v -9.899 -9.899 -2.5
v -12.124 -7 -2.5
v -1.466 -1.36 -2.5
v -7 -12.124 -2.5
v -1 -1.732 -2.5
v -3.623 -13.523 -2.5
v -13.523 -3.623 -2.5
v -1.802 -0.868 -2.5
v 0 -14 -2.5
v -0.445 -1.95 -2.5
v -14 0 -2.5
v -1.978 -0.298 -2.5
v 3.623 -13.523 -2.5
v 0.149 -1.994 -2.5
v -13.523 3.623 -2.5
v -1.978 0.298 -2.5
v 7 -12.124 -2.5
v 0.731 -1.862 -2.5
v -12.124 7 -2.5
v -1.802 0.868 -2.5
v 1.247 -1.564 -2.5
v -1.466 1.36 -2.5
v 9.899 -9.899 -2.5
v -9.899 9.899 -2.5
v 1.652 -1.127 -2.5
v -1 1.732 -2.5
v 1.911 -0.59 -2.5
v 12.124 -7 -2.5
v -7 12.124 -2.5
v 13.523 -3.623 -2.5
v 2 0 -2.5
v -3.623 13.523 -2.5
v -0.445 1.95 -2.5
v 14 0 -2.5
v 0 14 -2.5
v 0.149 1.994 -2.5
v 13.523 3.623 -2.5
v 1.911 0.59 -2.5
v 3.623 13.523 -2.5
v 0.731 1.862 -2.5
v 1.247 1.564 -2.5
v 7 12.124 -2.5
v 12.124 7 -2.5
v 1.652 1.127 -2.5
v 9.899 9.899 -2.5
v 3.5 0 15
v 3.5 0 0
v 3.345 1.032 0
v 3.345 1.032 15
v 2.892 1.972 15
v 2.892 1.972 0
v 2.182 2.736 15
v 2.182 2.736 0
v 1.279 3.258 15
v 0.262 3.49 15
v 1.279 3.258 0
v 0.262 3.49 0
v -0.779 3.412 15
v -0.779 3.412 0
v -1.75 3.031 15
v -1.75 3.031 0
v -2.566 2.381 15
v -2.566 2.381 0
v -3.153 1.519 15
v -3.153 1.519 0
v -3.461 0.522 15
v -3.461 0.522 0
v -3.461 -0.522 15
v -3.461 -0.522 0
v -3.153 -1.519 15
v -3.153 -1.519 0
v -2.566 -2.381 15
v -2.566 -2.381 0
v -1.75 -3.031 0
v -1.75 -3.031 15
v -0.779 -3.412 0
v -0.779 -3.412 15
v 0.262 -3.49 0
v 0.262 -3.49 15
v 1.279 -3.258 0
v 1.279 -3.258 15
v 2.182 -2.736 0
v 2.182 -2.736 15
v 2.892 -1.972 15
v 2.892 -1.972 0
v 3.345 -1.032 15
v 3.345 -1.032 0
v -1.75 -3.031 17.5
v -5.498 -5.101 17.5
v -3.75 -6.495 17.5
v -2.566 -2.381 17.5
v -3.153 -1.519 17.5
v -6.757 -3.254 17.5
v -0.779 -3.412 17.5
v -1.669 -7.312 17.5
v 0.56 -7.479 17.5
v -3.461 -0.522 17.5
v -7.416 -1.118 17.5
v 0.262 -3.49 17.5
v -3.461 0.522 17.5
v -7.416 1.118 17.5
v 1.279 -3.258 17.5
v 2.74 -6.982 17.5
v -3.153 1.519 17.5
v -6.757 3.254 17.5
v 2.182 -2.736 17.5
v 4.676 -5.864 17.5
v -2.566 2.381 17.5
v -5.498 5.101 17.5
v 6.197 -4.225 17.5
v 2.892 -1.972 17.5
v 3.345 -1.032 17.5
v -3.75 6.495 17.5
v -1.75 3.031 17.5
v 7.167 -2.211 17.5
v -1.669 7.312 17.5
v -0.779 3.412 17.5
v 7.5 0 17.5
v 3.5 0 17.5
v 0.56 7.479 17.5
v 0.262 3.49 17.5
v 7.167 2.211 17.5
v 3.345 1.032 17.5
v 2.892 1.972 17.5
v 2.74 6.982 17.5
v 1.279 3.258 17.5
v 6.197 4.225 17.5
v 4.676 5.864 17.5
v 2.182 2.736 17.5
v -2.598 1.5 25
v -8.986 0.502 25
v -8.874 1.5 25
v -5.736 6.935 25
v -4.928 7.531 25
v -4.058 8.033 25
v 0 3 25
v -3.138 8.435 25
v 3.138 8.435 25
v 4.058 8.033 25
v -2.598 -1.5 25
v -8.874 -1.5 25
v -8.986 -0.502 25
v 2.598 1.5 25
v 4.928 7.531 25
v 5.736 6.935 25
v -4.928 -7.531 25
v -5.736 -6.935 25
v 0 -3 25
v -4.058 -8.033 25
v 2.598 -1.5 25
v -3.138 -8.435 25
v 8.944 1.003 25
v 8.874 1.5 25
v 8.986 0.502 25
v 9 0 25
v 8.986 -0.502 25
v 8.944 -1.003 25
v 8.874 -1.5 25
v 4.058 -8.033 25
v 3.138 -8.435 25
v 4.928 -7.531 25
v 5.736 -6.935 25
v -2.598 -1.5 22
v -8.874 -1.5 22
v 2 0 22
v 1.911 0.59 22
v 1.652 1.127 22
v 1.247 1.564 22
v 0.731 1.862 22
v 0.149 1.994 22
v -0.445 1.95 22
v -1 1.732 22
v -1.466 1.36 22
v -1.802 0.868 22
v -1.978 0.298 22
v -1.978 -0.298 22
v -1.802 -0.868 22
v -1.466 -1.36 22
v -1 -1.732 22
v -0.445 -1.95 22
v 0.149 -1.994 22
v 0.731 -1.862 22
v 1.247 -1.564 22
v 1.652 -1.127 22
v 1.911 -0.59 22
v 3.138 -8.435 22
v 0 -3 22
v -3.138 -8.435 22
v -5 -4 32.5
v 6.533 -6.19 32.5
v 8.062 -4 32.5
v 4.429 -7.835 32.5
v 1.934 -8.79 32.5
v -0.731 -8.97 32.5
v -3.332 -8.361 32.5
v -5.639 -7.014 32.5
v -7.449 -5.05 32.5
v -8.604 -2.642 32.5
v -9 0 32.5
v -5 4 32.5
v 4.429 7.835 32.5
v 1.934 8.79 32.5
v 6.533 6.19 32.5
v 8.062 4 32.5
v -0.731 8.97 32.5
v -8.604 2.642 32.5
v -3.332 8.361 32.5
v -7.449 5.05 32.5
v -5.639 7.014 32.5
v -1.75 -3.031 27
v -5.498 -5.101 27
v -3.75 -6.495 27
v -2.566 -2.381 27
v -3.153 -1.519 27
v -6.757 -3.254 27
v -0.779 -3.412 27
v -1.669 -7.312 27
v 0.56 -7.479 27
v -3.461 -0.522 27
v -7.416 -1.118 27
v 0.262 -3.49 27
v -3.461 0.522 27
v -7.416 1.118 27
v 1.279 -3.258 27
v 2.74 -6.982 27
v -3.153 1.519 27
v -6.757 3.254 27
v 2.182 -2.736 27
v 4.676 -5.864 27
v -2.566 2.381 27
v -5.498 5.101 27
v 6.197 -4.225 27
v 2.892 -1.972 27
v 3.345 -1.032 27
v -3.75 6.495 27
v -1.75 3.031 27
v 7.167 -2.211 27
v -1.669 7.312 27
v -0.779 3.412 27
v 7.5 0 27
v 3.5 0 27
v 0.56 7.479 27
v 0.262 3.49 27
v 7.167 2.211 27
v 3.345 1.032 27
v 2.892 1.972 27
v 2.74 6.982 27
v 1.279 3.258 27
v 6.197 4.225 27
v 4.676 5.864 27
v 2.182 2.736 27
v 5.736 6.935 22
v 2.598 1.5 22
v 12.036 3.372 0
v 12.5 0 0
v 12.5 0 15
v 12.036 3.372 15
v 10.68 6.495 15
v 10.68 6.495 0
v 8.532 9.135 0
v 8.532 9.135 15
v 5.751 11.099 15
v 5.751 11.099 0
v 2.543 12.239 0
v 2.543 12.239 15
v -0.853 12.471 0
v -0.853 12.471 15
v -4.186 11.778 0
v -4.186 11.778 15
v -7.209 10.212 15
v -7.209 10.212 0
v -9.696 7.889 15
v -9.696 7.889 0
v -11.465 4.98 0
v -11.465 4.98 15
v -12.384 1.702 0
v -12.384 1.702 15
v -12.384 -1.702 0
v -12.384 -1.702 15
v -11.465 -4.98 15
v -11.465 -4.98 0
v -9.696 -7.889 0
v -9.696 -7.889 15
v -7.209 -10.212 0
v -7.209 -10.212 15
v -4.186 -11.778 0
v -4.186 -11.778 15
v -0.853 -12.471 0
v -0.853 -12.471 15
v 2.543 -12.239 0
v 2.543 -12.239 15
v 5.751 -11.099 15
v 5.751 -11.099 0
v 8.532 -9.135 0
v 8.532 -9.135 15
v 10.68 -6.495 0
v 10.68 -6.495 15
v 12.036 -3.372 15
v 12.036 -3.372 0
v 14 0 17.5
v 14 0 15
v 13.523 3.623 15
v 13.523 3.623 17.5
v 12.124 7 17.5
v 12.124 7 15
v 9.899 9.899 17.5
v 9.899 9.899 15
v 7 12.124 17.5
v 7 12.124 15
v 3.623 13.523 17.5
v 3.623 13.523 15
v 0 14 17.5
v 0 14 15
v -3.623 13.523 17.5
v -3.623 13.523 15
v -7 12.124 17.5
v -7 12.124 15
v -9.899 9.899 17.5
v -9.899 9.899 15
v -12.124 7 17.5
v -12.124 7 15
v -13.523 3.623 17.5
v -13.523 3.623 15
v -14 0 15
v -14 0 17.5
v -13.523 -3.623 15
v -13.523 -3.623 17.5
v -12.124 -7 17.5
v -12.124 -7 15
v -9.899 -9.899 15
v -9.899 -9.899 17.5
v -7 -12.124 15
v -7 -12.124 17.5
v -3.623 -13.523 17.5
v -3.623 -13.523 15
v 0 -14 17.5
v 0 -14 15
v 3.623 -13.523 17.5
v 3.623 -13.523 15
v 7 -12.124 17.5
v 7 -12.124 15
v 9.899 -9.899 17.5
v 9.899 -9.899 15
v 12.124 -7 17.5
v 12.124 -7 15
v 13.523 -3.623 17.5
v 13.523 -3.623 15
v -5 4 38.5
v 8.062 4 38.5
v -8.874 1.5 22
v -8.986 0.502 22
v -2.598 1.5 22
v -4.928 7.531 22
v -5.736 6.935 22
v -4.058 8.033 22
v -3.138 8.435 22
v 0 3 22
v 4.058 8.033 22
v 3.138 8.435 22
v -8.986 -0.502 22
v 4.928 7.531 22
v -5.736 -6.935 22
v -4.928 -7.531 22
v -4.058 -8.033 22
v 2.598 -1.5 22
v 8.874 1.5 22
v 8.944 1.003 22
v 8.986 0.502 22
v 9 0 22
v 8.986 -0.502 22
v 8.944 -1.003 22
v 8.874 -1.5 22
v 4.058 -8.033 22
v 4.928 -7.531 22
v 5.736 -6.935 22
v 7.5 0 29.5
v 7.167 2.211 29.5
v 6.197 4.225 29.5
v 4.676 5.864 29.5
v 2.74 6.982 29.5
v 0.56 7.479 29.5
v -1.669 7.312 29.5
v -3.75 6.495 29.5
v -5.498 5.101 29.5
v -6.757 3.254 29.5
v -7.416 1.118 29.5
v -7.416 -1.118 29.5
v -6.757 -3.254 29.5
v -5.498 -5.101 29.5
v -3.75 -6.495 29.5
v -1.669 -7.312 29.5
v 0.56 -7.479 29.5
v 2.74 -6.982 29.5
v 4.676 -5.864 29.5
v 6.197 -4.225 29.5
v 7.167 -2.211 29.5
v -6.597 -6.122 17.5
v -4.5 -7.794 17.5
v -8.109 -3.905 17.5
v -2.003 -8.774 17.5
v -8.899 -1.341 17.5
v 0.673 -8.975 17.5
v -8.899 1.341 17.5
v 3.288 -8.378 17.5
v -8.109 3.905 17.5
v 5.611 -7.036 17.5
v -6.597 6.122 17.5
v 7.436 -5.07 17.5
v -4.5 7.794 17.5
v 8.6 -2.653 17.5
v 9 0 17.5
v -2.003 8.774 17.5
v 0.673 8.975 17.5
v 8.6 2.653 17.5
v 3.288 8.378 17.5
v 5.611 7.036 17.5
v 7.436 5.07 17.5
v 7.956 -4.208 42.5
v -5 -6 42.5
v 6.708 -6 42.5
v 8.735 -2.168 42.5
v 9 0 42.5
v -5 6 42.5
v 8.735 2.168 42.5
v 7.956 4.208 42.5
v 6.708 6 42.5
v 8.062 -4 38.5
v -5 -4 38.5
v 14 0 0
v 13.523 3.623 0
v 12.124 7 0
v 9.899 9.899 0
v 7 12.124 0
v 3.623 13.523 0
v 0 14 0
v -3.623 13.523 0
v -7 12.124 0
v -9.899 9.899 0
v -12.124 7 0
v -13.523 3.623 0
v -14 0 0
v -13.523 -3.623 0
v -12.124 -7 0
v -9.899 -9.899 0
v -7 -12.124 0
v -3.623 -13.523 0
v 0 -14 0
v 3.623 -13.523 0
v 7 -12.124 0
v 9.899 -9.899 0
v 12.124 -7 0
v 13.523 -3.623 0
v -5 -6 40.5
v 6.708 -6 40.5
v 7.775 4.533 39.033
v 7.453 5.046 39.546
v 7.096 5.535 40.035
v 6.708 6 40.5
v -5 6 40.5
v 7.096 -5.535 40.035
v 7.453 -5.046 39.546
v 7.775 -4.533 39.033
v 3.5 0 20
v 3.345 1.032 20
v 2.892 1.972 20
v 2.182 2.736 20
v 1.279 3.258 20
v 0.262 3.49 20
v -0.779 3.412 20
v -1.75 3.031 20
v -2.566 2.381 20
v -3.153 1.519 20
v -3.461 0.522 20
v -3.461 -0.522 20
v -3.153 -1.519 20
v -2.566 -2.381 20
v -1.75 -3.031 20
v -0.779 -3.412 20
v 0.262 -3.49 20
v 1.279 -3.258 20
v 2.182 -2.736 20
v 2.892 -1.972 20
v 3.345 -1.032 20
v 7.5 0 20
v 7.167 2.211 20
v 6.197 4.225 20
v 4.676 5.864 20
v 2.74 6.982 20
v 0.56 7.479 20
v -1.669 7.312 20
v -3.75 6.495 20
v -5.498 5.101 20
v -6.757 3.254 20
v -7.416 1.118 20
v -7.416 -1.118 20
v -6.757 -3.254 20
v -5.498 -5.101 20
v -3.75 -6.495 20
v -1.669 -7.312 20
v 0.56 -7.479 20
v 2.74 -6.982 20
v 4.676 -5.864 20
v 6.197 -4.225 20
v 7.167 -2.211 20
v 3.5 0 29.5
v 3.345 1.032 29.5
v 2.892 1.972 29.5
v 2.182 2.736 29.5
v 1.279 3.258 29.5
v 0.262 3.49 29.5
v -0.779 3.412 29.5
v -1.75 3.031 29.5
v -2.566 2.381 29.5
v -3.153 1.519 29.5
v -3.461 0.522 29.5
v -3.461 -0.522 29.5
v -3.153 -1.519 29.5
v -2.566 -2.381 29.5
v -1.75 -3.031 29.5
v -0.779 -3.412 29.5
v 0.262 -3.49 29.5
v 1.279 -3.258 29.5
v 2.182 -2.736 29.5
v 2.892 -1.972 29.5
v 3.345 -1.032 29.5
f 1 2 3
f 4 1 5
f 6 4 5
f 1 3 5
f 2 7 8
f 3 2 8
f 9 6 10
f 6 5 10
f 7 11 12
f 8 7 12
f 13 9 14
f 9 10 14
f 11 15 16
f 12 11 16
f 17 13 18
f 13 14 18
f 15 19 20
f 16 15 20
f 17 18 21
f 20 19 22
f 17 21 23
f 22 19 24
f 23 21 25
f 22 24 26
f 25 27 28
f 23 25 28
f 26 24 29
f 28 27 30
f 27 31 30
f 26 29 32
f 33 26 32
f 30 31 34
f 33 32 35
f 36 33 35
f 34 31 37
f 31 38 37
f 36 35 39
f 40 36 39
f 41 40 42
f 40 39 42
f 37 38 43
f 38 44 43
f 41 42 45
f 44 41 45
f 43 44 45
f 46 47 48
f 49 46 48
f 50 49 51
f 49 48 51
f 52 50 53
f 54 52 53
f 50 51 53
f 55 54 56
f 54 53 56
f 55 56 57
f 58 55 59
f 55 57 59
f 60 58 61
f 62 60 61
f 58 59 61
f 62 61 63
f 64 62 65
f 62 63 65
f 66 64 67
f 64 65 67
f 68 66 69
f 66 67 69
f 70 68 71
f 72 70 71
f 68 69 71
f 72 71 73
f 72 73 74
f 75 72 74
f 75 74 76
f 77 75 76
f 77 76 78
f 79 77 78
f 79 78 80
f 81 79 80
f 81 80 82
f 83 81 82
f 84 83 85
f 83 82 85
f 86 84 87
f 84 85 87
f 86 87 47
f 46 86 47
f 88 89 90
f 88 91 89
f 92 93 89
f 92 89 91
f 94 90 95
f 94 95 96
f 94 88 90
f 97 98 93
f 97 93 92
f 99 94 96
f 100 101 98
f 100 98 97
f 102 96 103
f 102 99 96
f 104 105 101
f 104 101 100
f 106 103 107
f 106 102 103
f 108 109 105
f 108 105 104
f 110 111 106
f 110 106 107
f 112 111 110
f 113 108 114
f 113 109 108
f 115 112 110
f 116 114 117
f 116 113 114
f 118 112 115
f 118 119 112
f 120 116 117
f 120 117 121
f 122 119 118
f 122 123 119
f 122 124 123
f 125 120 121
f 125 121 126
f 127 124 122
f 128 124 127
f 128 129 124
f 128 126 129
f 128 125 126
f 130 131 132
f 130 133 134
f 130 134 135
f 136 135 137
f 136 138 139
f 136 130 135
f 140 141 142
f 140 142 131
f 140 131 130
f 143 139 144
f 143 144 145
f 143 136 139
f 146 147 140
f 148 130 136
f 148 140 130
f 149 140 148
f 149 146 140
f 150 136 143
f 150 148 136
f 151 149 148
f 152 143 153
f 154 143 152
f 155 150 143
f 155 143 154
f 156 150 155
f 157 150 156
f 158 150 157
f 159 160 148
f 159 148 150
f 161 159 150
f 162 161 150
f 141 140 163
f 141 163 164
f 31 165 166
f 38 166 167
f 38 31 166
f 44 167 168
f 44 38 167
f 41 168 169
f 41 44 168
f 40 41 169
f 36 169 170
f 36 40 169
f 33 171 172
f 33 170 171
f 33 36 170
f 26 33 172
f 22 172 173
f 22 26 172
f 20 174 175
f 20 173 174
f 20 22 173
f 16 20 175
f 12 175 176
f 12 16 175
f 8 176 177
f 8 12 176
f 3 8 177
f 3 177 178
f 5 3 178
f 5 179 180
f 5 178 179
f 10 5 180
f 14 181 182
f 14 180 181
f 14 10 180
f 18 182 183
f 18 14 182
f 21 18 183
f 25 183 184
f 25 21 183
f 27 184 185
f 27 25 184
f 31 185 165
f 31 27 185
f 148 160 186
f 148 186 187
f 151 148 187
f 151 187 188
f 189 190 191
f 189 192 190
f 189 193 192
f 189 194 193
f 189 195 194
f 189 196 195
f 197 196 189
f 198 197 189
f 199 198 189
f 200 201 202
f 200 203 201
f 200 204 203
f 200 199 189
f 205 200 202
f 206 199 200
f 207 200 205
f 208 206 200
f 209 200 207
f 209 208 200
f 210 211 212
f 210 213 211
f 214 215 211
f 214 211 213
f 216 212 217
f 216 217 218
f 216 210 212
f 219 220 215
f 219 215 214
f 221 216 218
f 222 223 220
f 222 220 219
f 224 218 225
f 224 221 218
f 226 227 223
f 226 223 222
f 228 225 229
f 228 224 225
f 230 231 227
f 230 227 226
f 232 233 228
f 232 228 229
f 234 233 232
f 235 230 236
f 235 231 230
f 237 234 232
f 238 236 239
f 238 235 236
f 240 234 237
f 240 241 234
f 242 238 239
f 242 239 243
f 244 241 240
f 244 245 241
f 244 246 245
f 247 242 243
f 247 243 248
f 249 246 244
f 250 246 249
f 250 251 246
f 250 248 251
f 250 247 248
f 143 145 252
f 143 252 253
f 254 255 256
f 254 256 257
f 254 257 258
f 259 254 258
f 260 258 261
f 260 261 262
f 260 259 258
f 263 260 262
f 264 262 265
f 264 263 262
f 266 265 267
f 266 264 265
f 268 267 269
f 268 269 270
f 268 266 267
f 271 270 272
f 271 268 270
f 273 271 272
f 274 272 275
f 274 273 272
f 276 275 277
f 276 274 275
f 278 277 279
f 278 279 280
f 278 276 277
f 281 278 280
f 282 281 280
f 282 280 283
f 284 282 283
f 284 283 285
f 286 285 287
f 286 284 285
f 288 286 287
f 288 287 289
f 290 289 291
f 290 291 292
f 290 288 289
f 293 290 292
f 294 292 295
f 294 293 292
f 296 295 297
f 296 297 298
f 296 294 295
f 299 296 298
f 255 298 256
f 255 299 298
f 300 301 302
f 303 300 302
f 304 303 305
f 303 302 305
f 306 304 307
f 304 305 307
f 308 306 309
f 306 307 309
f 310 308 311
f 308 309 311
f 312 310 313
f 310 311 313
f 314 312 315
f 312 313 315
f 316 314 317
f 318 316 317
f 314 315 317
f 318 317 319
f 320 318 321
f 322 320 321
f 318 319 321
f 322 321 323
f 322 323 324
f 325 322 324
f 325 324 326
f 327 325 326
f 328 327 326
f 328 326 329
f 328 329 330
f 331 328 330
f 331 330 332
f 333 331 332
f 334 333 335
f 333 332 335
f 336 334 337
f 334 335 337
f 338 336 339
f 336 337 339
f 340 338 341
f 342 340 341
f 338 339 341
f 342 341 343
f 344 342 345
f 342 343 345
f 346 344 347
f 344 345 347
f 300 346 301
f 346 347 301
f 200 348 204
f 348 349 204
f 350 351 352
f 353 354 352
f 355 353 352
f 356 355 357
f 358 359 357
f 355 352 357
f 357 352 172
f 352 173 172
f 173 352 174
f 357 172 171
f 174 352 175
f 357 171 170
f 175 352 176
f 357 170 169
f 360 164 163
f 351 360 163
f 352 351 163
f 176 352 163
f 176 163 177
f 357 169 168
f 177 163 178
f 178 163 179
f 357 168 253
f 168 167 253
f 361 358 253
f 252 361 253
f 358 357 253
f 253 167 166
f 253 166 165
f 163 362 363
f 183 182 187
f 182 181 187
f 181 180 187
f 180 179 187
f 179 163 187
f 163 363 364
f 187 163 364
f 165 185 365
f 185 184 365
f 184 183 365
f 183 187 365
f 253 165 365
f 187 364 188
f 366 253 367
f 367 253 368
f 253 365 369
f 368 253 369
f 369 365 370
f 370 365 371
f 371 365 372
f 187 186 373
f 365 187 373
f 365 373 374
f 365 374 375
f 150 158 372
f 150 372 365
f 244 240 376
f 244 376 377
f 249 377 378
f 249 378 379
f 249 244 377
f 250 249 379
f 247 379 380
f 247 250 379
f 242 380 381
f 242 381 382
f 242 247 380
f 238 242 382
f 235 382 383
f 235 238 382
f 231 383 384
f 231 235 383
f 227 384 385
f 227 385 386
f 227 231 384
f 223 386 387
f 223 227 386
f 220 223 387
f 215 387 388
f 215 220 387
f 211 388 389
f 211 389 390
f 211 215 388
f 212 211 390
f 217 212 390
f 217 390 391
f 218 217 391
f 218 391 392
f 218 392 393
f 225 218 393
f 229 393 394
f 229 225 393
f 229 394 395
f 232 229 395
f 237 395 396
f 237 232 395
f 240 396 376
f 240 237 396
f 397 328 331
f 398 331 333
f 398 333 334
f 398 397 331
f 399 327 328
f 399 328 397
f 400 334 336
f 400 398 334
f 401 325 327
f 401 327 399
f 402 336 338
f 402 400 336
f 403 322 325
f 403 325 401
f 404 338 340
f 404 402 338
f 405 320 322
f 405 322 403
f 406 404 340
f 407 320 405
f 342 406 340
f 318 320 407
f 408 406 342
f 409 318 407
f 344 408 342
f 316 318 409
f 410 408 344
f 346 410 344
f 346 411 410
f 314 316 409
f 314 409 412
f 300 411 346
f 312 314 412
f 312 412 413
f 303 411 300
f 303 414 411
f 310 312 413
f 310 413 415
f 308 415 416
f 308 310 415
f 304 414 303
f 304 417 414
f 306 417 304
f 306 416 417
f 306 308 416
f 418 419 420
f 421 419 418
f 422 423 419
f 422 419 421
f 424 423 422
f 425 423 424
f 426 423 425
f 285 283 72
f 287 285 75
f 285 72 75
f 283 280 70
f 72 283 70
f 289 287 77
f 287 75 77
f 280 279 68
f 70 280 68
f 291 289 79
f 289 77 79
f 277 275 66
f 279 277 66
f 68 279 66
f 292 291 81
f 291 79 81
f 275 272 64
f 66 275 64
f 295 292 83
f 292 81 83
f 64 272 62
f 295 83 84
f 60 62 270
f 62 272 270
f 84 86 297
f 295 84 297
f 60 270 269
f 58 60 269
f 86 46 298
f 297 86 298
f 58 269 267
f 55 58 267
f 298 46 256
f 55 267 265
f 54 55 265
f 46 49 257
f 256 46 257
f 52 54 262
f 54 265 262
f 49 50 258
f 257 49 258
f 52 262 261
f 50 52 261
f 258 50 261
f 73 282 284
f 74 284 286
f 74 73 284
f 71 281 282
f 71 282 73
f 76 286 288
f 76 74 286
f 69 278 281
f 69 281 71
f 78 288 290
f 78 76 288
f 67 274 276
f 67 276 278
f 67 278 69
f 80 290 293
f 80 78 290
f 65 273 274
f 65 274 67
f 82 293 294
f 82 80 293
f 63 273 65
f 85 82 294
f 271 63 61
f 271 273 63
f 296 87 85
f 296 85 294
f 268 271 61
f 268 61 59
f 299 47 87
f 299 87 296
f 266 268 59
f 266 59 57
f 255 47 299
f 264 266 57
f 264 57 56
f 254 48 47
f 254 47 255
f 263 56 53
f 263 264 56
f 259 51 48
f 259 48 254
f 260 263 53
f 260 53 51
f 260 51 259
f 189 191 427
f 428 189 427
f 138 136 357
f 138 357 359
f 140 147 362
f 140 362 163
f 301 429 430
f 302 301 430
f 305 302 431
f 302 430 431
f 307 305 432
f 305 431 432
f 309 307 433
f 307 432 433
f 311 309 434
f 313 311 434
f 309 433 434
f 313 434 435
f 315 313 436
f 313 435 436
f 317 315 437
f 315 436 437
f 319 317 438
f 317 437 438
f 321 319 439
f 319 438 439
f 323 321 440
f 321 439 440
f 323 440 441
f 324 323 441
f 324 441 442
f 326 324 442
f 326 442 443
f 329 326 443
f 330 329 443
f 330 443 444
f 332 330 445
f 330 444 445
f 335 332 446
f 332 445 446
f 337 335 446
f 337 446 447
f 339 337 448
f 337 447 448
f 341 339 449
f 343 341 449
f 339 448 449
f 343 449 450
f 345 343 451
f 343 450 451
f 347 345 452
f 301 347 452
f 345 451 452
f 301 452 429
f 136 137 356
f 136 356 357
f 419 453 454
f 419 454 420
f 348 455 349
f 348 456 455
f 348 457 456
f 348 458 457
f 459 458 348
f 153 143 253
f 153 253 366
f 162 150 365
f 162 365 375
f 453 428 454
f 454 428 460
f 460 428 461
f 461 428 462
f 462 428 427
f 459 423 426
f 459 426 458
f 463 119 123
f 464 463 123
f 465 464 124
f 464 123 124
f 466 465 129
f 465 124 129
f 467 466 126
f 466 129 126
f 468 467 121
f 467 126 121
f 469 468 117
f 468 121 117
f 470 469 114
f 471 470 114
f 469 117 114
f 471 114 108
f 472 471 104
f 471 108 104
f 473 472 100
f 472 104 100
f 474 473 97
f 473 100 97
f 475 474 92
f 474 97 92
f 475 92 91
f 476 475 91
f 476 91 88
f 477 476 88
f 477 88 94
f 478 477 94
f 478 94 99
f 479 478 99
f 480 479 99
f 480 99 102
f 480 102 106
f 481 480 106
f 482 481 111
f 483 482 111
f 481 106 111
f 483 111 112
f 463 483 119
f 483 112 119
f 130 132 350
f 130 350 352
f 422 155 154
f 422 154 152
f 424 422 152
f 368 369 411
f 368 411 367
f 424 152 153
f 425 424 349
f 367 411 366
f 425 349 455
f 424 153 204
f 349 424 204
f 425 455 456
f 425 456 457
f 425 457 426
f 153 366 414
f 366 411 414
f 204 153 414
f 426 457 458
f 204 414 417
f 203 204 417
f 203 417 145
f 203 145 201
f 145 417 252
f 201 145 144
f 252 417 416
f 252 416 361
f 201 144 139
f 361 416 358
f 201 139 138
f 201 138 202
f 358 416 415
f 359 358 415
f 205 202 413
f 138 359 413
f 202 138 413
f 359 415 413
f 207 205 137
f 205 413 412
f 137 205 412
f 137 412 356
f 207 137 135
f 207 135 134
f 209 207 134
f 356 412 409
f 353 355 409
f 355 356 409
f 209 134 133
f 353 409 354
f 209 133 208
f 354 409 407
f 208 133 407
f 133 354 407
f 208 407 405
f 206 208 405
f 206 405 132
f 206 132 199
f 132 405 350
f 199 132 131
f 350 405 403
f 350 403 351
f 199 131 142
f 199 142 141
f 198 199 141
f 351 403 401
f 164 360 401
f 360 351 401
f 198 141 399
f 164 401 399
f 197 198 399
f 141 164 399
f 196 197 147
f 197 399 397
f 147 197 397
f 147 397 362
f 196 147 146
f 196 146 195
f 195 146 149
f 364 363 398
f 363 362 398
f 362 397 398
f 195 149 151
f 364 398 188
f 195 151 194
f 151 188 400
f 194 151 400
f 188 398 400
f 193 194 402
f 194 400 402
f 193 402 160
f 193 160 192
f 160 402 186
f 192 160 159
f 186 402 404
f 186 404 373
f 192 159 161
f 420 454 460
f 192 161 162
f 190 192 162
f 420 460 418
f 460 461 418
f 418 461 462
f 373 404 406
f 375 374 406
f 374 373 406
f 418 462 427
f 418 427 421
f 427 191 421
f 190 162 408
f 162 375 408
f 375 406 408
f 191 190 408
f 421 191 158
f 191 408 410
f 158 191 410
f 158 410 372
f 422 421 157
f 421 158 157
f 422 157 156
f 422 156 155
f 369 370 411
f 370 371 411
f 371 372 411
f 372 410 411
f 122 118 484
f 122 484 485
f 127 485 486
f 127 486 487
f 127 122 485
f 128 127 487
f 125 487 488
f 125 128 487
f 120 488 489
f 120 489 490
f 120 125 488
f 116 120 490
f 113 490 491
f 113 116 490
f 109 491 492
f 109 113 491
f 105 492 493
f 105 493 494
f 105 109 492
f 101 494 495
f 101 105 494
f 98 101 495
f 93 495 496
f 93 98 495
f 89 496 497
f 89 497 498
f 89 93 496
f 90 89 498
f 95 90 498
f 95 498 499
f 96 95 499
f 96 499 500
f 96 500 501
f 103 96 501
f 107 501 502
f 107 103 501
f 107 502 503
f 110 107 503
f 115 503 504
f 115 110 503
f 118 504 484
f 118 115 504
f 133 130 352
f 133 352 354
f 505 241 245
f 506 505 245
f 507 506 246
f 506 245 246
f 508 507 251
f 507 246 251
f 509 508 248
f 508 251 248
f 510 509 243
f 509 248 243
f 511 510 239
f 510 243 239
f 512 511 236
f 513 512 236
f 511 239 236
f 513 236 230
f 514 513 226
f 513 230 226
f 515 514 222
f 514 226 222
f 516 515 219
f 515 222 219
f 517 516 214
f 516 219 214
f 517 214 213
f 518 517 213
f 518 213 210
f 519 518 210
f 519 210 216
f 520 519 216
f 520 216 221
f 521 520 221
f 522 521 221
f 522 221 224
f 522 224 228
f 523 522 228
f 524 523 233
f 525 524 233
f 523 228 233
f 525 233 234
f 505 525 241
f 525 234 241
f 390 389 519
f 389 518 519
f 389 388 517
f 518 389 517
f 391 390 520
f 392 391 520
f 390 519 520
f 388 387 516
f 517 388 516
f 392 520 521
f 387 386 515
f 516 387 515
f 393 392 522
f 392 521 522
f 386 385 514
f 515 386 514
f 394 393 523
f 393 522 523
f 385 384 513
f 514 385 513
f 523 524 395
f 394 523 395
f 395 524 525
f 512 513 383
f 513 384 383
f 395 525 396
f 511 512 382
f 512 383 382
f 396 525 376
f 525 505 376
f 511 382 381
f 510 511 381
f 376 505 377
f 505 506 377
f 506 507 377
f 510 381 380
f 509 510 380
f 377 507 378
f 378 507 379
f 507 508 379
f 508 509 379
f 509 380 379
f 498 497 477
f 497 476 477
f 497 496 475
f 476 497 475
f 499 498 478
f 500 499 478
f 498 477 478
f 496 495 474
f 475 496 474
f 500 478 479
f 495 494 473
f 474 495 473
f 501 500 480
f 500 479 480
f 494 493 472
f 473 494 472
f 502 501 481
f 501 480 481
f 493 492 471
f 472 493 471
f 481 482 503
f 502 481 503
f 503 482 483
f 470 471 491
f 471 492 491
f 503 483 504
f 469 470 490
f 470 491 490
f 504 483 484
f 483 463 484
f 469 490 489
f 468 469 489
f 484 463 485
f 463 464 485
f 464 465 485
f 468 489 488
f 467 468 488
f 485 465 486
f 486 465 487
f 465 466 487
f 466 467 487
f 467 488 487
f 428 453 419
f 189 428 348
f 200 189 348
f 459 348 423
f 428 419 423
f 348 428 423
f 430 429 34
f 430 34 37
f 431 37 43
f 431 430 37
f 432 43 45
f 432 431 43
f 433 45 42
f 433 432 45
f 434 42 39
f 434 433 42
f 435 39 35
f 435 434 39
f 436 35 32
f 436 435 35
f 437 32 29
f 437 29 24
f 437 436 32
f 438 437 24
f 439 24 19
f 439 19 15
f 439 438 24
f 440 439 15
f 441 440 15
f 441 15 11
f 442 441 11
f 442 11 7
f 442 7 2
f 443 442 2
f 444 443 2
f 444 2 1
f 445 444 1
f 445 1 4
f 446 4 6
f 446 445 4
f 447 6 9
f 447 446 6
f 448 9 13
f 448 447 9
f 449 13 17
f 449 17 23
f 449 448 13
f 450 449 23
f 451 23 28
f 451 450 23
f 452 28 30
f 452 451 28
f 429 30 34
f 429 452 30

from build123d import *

# Parameters (mm, degrees)
F0_R          = 14
F0_R_2        = 12.5
F0_R_3        = 3.5
F0_R_4        = 2
F1_DEPTH      = 2.5
F2_DEPTH      = 15
F3_R          = 14
F3_R_2        = 2
F4_DEPTH      = 2.5
F5_R          = 9
F5_R_2        = 7.5
F5_R_3        = 3.5
F5_R_4        = 2
F6_DEPTH      = 25
F8_DEPTH      = 25
F8_DEPTH_BACK = 25
F9_W          = 8
F9_H          = 14.2362220213
F10_DEPTH     = 10
F11_DEPTH     = 25
F13_DEPTH     = 3
F14_DEPTH     = 2.5
F15_START     = 9.5
F15_DEPTH     = 2.5
F16_SIZE2     = 1.99999
F16_SIZE      = 1.99999


# Not quite as in the source:
# - a fillet or chamfer is up to 0.001 mm smaller than in the source, because OpenCascade refuses the exact size


with BuildPart() as f1:
    # F0 (on Top) → F1 (new body)
    with BuildSketch(Plane.XY):
        Circle(F0_R)
        Circle(F0_R_2, mode=Mode.SUBTRACT)
        Circle(F0_R_2)
        Circle(F0_R_3, mode=Mode.SUBTRACT)
        Circle(F0_R_3)
        Circle(F0_R_4, mode=Mode.SUBTRACT)
    extrude(amount=-F1_DEPTH)

    # F0 (on Top) → F2 (join)
    with BuildSketch(Plane.XY):
        Circle(F0_R)
        Circle(F0_R_2, mode=Mode.SUBTRACT)
        Circle(F0_R_3)
        Circle(F0_R_4, mode=Mode.SUBTRACT)
    extrude(amount=F2_DEPTH)

    # F3 (on face) → F4 (join)
    with BuildSketch(Plane.XY.offset(15)):
        Circle(F3_R)
        Circle(F3_R_2, mode=Mode.SUBTRACT)
    extrude(amount=F4_DEPTH)

    # F5 (on face) → F6 (join)
    with BuildSketch(Plane.XY.offset(17.5)):
        Circle(F5_R)
        Circle(F5_R_2, mode=Mode.SUBTRACT)
        Circle(F5_R_2)
        Circle(F5_R_3, mode=Mode.SUBTRACT)
        Circle(F5_R_3)
        Circle(F5_R_4, mode=Mode.SUBTRACT)
        Circle(F5_R_4)
    extrude(amount=F6_DEPTH)

    # F7 (on Right) → F8 (cut, two sides)
    with BuildSketch(Plane.YZ) as f8_sk:
        Polygon((-6, 40.5), (-6, 42.5), (-9, 42.5), (-9, 32.5), (-4, 32.5), (-4, 40.5), align=None)
        Polygon((9, 42.5), (6, 42.5), (6, 40.5), (4, 40.5), (4, 32.5), (9, 32.5), align=None)
    extrude(amount=F8_DEPTH, mode=Mode.SUBTRACT)
    extrude(f8_sk.sketch, amount=-F8_DEPTH_BACK, mode=Mode.SUBTRACT)

    # F9 (on face) → F10 (cut)
    with BuildSketch(Plane.XY.offset(42.5)):
        with Locations((-9, 0)):
            Rectangle(F9_W, F9_H)
    extrude(amount=-F10_DEPTH, mode=Mode.SUBTRACT)

    # F0 (on Top) → F11 (cut)
    with BuildSketch(Plane.XY):
        Circle(F0_R_4)
    extrude(amount=F11_DEPTH, mode=Mode.SUBTRACT)

    # F12 (on face) → F13 (cut)
    with BuildSketch(Plane(origin=(0, 0, 25), x_dir=(1, 0, 0), z_dir=(0, 0, -1))):
        Polygon((2.5980762114, -1.5), (23.6776883676, -1.5), (23.6776883676, 1.5), (2.5980762114, 1.5), (1.7320508076, 0), align=None)
        Polygon((13.1378822895, -19.7554796292), (2.5980762114, -1.5), (0.8660254038, -1.5), (0, -3), (10.5398060781, -21.2554796292), align=None)
        Polygon((0.8660254038, -1.5), (2.5980762114, -1.5), (1.7320508076, 0), align=None)
        Polygon((0, -3), (0.8660254038, -1.5), (-0.8660254038, -1.5), align=None)
        Polygon((0.8660254038, 1.5), (1.7320508076, 0), (2.5980762114, 1.5), align=None)
        Polygon((0.8660254038, 1.5), (2.5980762114, 1.5), (13.1378822895, 19.7554796292), (10.5398060781, 21.2554796292), (0, 3), align=None)
        Polygon((0, -3), (-0.8660254038, -1.5), (-2.5980762114, -1.5), (-13.1378822895, -19.7554796292), (-10.5398060781, -21.2554796292), align=None)
        Polygon((-2.5980762114, -1.5), (-0.8660254038, -1.5), (-1.7320508076, 0), align=None)
        Polygon((-0.8660254038, 1.5), (0.8660254038, 1.5), (0, 3), align=None)
        Polygon((-23.6776883676, -1.5), (-2.5980762114, -1.5), (-1.7320508076, 0), (-2.5980762114, 1.5), (-23.6776883676, 1.5), align=None)
        Polygon((-2.5980762114, 1.5), (-1.7320508076, 0), (-0.8660254038, 1.5), align=None)
        Polygon((-2.5980762114, 1.5), (-0.8660254038, 1.5), (0, 3), (-10.5398060781, 21.2554796292), (-13.1378822895, 19.7554796292), align=None)
    extrude(amount=F13_DEPTH, mode=Mode.SUBTRACT)

    # F5 (on face) → F14 (cut)
    with BuildSketch(Plane.XY.offset(17.5)):
        Circle(F5_R_2)
        Circle(F5_R_3, mode=Mode.SUBTRACT)
    extrude(amount=F14_DEPTH, mode=Mode.SUBTRACT)

    # F5 (on face) → F15 (cut)
    with BuildSketch(Plane.XY.offset(17.5).offset(F15_START)):
        Circle(F5_R_2)
        Circle(F5_R_3, mode=Mode.SUBTRACT)
    extrude(amount=F15_DEPTH, mode=Mode.SUBTRACT)

    # F16 (size 2 and 2 in the source; OpenCascade refuses exactly that, so slightly less here)
    f16_edges = [f1.edges().sort_by_distance(p)[0] for p in [
        (1.531129, -4, 40.5),
        (1.531129, 4, 40.5),
    ]]
    chamfer(f16_edges, length=F16_SIZE, length2=F16_SIZE2)


solid = f1.part
